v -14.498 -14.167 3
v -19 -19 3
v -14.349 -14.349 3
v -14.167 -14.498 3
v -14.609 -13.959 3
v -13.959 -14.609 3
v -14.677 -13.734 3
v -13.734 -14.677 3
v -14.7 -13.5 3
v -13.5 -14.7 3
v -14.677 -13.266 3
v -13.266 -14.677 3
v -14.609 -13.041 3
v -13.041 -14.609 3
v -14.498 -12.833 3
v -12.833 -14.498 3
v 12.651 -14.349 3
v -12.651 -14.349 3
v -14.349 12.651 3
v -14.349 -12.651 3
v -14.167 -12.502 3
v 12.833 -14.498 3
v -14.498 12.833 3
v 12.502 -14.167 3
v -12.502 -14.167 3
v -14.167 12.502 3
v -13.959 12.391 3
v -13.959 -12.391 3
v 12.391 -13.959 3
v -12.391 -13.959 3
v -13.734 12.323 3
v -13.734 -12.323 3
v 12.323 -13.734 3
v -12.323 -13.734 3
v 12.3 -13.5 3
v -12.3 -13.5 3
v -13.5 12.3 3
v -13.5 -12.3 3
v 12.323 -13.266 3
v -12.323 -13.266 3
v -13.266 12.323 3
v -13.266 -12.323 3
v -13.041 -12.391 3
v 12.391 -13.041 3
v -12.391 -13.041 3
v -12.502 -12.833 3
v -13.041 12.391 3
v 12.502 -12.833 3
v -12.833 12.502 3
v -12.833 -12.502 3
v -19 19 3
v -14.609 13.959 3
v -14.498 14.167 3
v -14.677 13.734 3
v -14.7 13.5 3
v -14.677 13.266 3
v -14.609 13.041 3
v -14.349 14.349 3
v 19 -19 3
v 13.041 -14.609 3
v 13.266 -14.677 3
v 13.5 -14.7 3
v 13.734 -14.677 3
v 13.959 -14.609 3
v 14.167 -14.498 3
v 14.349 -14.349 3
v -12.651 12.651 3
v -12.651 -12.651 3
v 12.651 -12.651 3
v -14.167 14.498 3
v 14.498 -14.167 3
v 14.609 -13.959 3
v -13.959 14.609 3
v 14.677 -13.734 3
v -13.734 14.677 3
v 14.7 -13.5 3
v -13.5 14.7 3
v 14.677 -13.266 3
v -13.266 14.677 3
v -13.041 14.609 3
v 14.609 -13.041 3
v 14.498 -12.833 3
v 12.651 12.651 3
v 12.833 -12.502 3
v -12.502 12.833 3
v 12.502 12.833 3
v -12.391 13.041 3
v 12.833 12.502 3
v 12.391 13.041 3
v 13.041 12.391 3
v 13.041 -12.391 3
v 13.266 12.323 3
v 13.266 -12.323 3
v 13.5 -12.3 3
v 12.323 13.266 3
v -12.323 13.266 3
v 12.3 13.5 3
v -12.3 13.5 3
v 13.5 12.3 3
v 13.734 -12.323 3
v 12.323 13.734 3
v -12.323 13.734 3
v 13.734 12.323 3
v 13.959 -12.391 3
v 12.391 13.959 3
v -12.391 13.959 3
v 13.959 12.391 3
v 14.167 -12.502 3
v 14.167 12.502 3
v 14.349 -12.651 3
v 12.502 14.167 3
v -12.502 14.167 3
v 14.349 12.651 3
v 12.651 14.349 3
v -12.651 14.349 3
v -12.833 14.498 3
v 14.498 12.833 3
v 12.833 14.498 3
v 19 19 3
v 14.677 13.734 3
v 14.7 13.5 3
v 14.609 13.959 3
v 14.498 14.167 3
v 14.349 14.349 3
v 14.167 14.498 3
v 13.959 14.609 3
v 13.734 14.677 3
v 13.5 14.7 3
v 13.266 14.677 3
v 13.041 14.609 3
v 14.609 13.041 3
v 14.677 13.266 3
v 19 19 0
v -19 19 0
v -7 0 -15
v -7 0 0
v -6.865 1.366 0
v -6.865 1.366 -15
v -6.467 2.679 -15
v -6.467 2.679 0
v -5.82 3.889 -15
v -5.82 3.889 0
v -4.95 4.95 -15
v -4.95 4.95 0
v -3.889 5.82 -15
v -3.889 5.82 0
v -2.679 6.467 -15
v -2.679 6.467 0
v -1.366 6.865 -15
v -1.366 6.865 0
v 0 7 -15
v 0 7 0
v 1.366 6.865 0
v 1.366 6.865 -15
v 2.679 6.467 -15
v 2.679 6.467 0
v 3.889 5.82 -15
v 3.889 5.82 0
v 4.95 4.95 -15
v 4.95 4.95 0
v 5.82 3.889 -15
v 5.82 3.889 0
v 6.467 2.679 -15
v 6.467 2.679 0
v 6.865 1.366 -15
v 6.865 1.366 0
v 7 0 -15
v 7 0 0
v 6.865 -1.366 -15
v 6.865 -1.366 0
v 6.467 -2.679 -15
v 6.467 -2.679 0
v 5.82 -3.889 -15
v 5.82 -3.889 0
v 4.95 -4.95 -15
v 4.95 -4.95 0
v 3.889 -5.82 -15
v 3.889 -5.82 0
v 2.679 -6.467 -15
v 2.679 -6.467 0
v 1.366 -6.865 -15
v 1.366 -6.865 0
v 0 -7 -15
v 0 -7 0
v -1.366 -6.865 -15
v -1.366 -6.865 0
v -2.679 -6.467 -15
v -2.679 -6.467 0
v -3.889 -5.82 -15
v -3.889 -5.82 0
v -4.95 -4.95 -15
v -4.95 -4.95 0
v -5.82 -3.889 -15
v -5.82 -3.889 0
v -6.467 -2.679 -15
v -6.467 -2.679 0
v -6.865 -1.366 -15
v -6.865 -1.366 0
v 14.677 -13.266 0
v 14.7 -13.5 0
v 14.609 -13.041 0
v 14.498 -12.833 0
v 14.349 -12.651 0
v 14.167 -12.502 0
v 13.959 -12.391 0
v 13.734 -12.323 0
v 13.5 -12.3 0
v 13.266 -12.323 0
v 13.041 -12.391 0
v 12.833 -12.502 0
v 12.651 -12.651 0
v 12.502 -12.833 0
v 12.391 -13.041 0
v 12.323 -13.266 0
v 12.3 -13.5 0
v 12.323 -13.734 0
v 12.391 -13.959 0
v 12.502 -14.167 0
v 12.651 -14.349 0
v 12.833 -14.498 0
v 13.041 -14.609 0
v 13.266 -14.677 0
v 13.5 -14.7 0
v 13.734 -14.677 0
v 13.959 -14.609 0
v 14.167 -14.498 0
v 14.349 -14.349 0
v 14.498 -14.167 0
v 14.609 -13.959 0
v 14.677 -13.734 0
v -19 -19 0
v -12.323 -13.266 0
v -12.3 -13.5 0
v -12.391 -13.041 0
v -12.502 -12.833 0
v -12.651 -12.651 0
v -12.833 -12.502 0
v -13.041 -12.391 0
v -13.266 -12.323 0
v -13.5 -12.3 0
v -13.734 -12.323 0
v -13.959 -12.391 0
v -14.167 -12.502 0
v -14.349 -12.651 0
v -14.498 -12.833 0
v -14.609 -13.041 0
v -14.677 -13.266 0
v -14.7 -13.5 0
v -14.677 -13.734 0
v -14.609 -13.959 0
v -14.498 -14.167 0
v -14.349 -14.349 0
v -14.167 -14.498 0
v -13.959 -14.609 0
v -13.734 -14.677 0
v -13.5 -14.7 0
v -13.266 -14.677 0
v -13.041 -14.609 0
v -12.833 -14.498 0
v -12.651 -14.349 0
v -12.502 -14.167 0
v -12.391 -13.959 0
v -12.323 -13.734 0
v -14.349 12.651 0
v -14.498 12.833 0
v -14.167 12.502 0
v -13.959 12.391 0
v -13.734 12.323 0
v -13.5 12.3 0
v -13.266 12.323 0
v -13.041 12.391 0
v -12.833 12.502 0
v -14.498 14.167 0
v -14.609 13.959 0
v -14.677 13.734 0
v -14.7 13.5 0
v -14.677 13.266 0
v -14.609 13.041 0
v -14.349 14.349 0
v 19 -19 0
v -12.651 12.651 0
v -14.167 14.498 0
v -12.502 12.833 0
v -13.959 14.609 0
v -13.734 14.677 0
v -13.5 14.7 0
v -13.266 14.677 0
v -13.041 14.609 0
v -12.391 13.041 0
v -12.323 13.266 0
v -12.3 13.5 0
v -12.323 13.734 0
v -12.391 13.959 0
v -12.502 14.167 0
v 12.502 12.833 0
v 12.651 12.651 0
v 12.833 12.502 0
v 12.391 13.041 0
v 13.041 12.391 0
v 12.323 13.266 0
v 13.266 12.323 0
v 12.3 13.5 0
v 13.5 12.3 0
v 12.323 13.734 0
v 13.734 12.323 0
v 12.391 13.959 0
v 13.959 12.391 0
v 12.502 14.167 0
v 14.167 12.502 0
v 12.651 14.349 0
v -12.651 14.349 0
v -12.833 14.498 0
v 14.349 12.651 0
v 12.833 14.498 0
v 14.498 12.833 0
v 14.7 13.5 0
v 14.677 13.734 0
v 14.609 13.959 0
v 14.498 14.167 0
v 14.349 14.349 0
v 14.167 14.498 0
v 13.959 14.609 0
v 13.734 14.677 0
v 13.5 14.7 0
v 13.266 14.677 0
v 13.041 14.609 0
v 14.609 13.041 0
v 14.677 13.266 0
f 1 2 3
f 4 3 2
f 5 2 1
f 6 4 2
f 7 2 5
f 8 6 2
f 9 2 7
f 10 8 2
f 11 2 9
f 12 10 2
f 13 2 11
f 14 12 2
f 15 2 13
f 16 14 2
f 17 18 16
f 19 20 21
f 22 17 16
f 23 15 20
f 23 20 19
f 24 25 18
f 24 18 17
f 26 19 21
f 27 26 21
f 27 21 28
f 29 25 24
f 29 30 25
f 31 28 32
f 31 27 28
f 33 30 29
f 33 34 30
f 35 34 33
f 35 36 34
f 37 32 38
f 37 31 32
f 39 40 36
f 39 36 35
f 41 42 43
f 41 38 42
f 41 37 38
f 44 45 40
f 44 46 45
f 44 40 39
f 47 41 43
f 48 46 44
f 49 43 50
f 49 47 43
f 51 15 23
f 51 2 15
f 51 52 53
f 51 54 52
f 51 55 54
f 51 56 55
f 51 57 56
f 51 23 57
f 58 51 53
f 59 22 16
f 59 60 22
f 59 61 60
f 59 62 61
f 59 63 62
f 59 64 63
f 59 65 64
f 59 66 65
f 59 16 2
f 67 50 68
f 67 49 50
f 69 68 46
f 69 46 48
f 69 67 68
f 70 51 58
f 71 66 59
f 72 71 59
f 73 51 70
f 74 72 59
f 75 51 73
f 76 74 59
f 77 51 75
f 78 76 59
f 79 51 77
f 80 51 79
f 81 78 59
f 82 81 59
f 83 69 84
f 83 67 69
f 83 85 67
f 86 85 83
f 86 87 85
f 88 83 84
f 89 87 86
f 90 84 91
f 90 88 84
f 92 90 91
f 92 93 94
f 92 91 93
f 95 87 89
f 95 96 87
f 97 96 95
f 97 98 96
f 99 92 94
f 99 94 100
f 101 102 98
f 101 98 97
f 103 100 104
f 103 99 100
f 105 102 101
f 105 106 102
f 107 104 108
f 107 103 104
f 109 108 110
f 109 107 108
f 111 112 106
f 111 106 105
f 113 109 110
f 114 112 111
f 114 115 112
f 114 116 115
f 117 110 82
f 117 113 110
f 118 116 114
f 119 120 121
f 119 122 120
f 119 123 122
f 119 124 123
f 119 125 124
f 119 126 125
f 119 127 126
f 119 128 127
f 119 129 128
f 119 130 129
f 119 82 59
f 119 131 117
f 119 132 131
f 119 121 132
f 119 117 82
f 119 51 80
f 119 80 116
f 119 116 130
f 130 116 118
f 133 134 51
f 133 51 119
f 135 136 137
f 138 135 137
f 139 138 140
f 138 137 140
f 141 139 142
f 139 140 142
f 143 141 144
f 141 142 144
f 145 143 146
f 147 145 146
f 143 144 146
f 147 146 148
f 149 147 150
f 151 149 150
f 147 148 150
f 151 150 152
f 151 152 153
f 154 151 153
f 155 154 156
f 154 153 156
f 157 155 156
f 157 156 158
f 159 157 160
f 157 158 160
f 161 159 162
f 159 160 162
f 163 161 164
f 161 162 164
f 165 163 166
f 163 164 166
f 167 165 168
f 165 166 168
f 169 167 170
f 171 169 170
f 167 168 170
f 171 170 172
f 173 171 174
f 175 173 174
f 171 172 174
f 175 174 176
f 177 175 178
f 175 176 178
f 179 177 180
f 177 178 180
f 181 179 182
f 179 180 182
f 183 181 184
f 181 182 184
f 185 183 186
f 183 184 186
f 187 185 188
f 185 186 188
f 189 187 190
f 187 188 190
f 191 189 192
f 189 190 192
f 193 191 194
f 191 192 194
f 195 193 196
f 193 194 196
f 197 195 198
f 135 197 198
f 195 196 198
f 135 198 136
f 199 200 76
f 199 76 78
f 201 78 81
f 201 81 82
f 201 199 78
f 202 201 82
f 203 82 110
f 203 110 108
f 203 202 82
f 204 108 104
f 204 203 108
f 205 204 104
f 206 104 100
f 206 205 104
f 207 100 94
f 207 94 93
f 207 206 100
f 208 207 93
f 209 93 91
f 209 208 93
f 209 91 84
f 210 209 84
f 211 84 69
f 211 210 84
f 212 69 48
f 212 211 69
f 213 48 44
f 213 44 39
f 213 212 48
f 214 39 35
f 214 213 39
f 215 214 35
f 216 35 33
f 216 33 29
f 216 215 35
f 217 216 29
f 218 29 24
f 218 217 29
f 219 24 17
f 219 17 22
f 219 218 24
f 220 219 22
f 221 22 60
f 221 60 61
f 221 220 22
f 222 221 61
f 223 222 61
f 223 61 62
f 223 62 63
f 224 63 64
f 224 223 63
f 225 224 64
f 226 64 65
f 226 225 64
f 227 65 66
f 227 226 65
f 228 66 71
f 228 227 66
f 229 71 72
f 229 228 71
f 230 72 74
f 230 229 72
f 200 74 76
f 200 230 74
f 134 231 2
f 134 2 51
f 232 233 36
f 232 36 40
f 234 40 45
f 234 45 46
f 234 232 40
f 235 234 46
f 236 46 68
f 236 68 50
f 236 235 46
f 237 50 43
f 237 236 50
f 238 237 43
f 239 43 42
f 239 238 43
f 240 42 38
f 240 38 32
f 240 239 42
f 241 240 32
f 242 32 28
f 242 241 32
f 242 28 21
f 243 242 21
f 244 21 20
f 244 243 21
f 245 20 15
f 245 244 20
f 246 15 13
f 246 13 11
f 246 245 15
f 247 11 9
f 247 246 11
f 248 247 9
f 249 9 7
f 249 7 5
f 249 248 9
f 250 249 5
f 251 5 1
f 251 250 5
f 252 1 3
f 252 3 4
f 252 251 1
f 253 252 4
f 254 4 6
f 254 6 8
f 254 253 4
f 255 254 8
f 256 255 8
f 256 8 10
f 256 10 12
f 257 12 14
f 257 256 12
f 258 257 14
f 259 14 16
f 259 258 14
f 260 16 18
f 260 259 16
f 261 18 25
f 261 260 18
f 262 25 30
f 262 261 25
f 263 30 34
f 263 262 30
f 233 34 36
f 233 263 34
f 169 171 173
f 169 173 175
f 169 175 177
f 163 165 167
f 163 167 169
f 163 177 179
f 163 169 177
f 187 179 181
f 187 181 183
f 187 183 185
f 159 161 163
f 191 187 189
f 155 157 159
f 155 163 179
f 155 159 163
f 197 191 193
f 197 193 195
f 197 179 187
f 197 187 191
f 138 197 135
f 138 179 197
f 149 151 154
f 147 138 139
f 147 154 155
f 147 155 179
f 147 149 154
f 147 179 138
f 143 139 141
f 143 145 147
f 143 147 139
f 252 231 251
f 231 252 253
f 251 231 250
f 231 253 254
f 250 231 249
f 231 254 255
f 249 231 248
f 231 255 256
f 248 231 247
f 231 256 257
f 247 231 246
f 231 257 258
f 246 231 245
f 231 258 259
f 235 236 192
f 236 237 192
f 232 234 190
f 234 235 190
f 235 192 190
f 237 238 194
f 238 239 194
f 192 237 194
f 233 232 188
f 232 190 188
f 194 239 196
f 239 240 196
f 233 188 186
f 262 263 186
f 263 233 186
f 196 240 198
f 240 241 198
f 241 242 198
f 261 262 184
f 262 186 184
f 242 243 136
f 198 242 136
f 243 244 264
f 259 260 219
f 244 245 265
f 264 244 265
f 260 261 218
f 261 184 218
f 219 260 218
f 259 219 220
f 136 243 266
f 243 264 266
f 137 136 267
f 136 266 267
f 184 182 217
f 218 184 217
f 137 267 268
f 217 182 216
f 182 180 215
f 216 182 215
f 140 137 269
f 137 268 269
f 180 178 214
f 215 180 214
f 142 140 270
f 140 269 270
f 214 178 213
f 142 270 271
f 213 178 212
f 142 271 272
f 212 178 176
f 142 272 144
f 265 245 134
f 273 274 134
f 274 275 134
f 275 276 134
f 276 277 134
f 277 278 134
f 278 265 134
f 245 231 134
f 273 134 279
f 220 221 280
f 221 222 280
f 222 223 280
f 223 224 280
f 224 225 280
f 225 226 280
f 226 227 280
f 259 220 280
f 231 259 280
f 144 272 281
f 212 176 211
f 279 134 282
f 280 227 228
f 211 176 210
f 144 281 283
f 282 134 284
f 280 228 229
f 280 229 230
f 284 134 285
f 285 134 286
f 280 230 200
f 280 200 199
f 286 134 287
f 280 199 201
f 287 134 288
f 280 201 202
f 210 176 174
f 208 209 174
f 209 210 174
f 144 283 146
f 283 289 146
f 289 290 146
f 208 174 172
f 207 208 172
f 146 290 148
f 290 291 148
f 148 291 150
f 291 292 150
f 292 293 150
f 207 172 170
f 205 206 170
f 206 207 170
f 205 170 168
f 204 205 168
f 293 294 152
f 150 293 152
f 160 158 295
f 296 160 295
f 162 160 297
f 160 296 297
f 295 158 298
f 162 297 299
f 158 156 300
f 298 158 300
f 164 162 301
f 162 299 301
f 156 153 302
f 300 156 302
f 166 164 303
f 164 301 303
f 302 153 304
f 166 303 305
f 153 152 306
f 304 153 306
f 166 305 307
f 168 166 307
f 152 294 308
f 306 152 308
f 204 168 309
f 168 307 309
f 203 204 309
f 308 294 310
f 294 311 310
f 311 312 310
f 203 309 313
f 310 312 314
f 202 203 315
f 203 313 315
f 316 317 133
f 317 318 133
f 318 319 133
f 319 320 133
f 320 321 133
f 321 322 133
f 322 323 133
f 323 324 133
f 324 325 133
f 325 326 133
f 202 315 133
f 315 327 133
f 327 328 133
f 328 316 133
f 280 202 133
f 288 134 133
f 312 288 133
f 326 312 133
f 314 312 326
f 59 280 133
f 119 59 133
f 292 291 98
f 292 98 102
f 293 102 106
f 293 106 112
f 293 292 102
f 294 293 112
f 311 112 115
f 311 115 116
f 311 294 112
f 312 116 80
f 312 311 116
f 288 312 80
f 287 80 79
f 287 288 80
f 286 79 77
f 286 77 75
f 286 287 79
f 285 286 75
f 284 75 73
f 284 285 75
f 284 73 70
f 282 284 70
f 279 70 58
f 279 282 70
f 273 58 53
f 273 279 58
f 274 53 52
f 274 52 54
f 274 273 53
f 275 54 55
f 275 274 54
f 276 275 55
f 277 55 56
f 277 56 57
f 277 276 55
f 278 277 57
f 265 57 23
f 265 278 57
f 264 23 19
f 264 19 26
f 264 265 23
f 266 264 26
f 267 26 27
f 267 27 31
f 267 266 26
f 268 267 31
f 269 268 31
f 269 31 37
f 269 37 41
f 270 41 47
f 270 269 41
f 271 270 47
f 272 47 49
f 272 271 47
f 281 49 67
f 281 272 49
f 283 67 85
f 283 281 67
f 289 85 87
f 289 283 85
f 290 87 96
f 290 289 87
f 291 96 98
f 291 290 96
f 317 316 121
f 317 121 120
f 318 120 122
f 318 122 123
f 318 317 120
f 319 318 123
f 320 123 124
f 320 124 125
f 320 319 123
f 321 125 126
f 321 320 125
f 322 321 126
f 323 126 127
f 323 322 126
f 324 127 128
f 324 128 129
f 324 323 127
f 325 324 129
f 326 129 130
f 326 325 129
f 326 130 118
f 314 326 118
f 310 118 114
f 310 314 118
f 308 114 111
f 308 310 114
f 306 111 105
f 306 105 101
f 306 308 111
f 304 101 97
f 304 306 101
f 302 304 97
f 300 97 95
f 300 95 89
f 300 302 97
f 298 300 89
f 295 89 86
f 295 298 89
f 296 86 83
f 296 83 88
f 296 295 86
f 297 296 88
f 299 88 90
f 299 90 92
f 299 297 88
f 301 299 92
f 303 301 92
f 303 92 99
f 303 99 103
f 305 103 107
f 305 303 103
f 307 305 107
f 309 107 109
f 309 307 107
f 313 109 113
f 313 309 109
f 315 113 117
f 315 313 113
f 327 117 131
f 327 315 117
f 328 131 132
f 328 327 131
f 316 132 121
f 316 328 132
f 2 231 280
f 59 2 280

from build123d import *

# Parameters (mm, degrees)
SKETCH_1_W      = 38
SKETCH_1_H      = 38
SKETCH_1_R      = 1.2
EXTRUDE_1_DEPTH = 3
SKETCH_2_R      = 7
EXTRUDE_2_DEPTH = 15


with BuildPart() as part:
    # 草图1 → 凸台-拉伸1 (new body)
    with BuildSketch(Plane.XY):
        Rectangle(SKETCH_1_W, SKETCH_1_H)
        with Locations((-13.5, 13.5)):
            Circle(SKETCH_1_R, mode=Mode.SUBTRACT)
        with Locations((13.5, 13.5)):
            Circle(SKETCH_1_R, mode=Mode.SUBTRACT)
        with Locations((13.5, -13.5)):
            Circle(SKETCH_1_R, mode=Mode.SUBTRACT)
        with Locations((-13.5, -13.5)):
            Circle(SKETCH_1_R, mode=Mode.SUBTRACT)
    extrude(amount=EXTRUDE_1_DEPTH)

    # 草图2 → 凸台-拉伸2 (add)
    with BuildSketch(Plane(origin=(0, 0, 0), x_dir=(-1, 0, 0), z_dir=(0, 0, -1))):
        Circle(SKETCH_2_R)
    extrude(amount=EXTRUDE_2_DEPTH)


solid = part.part
